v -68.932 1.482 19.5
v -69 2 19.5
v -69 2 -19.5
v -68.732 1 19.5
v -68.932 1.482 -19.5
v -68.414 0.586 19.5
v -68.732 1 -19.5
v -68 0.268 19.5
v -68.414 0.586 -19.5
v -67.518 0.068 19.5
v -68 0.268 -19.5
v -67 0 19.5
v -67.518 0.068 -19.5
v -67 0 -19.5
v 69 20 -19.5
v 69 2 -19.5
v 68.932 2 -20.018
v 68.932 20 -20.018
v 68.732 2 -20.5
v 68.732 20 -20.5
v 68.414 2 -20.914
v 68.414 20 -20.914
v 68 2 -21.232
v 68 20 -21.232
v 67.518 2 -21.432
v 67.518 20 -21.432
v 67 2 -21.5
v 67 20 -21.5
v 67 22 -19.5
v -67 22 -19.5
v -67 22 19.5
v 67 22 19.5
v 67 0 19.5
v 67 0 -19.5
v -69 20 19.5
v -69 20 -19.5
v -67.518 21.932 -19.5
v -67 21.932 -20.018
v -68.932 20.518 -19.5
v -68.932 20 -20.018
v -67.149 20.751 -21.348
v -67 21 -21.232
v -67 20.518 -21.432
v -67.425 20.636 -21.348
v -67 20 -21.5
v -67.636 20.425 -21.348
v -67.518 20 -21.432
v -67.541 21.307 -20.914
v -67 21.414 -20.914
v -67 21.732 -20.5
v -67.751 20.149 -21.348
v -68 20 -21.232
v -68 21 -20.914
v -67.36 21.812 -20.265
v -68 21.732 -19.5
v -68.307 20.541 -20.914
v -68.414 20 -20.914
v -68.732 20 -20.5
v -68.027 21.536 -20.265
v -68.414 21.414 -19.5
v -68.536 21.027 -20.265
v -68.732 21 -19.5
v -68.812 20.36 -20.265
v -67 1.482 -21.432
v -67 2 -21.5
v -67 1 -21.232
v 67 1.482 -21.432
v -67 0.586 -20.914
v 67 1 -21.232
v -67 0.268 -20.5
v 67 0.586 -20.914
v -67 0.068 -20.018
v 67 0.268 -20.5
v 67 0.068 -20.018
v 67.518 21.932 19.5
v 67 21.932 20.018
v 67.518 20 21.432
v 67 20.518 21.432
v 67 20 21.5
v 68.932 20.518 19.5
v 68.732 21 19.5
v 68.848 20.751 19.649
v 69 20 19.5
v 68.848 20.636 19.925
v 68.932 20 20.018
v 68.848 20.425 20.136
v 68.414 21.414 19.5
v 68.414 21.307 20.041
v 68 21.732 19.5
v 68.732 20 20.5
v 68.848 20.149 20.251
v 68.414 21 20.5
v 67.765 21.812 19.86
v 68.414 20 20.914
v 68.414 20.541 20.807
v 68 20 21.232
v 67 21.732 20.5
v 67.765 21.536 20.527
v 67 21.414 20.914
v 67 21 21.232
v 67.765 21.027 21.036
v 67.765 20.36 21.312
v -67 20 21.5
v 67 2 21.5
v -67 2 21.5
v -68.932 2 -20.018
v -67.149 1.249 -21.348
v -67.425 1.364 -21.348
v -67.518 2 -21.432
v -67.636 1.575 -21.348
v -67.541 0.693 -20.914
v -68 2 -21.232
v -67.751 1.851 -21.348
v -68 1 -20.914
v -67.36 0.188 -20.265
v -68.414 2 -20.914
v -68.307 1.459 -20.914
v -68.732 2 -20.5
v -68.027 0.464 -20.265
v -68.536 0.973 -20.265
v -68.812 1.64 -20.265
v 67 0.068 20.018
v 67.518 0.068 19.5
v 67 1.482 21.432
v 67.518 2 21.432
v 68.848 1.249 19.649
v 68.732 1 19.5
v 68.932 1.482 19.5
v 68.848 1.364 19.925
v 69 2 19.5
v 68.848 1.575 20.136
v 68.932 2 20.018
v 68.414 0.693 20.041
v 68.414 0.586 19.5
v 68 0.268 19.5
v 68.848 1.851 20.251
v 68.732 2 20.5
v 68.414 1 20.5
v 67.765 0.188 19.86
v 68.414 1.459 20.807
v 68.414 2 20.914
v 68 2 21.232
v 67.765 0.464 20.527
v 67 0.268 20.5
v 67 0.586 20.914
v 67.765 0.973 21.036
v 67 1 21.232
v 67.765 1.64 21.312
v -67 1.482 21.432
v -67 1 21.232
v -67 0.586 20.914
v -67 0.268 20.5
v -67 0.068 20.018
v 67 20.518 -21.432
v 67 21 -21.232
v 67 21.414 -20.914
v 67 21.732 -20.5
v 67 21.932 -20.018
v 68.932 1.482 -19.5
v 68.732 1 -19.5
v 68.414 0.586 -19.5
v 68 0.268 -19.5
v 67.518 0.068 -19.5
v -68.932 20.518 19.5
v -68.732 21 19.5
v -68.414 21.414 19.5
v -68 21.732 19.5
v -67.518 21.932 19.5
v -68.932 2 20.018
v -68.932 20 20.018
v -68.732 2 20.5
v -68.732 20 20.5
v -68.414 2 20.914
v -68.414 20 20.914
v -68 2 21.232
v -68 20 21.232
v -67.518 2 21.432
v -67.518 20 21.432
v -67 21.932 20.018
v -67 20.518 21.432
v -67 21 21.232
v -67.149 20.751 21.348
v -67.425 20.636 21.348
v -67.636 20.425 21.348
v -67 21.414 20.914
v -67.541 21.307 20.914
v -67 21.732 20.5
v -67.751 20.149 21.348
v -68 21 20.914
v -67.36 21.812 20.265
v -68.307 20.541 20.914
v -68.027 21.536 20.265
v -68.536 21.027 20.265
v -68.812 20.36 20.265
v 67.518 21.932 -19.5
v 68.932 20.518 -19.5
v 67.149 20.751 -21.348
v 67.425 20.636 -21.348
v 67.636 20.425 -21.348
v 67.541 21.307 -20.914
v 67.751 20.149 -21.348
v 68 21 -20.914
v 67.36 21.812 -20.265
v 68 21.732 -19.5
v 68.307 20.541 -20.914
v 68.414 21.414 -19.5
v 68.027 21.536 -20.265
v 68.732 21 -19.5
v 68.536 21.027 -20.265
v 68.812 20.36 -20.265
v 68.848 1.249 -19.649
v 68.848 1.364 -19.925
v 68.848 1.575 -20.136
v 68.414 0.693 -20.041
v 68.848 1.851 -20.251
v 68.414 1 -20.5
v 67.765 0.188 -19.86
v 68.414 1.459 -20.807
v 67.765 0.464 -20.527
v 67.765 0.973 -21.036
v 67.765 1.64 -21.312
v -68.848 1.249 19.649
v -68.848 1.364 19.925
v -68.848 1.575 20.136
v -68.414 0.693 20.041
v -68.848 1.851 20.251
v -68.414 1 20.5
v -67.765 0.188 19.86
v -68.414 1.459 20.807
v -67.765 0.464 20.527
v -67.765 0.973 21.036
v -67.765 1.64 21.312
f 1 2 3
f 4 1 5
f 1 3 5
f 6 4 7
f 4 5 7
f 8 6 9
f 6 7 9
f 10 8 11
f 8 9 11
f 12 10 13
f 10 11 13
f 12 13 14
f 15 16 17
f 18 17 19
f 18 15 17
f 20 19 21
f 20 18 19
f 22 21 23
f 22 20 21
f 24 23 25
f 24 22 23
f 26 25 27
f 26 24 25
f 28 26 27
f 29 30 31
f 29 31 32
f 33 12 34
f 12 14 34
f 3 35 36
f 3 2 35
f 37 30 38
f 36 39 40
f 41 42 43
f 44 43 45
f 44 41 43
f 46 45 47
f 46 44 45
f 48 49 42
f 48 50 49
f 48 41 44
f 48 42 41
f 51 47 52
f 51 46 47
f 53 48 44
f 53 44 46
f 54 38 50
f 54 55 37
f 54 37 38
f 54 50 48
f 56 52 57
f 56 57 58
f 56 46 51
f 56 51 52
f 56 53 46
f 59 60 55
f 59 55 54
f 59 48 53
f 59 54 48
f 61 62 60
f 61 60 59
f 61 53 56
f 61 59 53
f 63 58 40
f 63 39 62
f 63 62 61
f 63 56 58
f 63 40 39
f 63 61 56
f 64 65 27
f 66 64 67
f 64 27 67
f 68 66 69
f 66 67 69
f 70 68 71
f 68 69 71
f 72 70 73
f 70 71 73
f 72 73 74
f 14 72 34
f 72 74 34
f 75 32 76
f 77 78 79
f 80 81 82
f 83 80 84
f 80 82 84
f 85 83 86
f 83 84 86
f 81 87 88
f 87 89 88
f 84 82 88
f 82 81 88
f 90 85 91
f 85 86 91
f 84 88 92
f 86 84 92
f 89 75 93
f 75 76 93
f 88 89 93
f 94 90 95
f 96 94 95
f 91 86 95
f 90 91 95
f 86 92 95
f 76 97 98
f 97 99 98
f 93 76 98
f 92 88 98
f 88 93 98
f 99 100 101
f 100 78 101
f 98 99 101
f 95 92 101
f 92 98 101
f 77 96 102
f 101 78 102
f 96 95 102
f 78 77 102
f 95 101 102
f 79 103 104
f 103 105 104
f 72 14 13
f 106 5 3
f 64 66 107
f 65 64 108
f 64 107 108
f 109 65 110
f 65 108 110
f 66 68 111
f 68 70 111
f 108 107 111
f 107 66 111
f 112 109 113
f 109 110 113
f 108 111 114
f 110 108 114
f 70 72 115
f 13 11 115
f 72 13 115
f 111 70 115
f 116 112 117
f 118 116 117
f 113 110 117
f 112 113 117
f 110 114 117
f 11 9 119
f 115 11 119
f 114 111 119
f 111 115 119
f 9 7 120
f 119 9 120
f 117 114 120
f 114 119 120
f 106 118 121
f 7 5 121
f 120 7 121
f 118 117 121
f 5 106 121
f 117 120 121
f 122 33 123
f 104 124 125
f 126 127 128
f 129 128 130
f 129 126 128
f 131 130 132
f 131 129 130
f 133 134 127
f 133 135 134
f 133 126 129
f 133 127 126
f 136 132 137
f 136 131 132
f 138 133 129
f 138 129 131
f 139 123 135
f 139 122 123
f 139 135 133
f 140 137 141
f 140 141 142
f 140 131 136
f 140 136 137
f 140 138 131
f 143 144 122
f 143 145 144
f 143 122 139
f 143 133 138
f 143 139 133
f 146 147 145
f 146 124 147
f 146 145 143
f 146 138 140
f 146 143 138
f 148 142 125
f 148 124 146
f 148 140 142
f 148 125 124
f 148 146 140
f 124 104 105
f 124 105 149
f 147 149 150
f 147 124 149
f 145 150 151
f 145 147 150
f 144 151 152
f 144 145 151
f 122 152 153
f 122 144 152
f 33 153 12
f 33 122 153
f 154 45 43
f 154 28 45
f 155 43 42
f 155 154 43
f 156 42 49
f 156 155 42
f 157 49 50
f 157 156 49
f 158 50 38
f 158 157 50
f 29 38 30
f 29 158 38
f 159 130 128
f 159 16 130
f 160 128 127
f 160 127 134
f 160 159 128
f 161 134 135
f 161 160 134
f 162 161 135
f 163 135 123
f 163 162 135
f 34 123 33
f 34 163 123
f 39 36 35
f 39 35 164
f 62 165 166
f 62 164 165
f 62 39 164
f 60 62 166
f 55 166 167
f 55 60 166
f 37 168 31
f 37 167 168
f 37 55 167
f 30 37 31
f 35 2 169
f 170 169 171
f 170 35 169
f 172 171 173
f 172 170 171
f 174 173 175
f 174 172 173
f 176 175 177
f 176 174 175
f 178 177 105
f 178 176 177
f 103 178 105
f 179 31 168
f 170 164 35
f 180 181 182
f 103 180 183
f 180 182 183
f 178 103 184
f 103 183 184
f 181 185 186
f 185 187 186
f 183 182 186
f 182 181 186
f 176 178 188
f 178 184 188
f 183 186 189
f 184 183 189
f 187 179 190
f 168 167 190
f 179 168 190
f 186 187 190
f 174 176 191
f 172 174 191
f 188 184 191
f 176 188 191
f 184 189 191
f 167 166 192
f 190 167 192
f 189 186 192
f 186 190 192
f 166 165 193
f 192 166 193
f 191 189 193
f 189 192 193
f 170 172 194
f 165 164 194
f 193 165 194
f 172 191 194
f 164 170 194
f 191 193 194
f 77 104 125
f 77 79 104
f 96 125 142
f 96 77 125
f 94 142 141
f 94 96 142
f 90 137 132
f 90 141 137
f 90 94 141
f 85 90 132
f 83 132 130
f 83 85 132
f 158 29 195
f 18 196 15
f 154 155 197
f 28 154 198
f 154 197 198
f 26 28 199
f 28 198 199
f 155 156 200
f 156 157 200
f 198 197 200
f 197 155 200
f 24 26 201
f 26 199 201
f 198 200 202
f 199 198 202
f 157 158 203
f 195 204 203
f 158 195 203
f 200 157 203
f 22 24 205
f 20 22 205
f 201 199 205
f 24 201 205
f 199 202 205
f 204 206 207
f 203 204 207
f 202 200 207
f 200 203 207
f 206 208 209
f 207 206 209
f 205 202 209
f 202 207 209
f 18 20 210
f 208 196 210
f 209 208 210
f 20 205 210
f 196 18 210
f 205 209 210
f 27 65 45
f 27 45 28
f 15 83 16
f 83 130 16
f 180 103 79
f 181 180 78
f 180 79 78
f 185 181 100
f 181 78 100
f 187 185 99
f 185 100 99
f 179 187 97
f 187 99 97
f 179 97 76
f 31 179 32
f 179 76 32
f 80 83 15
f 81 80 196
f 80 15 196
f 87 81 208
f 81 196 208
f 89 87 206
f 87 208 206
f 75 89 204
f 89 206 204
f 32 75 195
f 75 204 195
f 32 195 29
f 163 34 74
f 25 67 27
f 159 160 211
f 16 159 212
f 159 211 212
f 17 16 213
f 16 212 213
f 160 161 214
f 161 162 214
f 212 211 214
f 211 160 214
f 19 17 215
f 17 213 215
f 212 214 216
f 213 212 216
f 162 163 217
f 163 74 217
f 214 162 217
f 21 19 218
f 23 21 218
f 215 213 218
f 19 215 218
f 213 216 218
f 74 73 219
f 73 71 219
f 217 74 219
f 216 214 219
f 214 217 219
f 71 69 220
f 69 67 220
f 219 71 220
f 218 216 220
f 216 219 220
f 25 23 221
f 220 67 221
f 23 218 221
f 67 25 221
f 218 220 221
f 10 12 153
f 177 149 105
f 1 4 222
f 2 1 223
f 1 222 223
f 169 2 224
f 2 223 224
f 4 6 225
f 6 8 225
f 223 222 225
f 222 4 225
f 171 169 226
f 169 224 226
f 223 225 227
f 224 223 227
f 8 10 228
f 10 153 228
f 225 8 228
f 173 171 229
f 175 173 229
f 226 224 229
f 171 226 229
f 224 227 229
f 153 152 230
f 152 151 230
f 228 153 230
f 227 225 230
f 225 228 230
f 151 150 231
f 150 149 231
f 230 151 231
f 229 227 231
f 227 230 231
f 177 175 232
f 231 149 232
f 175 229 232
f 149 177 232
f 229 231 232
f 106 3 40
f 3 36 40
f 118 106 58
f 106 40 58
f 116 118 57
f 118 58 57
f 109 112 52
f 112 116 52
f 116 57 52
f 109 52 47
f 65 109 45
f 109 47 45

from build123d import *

# Parameters (mm, degrees)
SKIZZE1_W          = 138
SKIZZE1_H          = 43
GRUNDKOERPER_DEPTH = 22
VERRUNDUNG1_R      = 2


with BuildPart() as part:
    # Skizze1 → Grundkoerper (new body)
    with BuildSketch(Plane(origin=(0, 0, 0), x_dir=(1, 0, 0), z_dir=(0, 1, 0))):
        Rectangle(SKIZZE1_W, SKIZZE1_H)
    extrude(amount=GRUNDKOERPER_DEPTH)

    # Verrundung1
    verrundung1_edges = [part.edges().sort_by_distance(p)[0] for p in [
        (-69, 22, 0),
        (0, 22, 21.5),
        (69, 22, 0),
        (0, 0, 21.5),
        (-69, 0, 0),
        (0, 0, -21.5),
        (69, 0, 0),
        (0, 22, -21.5),
        (69, 11, 21.5),
        (-69, 11, 21.5),
        (-69, 11, -21.5),
        (69, 11, -21.5),
    ]]
    fillet(verrundung1_edges, radius=VERRUNDUNG1_R)


solid = part.part
